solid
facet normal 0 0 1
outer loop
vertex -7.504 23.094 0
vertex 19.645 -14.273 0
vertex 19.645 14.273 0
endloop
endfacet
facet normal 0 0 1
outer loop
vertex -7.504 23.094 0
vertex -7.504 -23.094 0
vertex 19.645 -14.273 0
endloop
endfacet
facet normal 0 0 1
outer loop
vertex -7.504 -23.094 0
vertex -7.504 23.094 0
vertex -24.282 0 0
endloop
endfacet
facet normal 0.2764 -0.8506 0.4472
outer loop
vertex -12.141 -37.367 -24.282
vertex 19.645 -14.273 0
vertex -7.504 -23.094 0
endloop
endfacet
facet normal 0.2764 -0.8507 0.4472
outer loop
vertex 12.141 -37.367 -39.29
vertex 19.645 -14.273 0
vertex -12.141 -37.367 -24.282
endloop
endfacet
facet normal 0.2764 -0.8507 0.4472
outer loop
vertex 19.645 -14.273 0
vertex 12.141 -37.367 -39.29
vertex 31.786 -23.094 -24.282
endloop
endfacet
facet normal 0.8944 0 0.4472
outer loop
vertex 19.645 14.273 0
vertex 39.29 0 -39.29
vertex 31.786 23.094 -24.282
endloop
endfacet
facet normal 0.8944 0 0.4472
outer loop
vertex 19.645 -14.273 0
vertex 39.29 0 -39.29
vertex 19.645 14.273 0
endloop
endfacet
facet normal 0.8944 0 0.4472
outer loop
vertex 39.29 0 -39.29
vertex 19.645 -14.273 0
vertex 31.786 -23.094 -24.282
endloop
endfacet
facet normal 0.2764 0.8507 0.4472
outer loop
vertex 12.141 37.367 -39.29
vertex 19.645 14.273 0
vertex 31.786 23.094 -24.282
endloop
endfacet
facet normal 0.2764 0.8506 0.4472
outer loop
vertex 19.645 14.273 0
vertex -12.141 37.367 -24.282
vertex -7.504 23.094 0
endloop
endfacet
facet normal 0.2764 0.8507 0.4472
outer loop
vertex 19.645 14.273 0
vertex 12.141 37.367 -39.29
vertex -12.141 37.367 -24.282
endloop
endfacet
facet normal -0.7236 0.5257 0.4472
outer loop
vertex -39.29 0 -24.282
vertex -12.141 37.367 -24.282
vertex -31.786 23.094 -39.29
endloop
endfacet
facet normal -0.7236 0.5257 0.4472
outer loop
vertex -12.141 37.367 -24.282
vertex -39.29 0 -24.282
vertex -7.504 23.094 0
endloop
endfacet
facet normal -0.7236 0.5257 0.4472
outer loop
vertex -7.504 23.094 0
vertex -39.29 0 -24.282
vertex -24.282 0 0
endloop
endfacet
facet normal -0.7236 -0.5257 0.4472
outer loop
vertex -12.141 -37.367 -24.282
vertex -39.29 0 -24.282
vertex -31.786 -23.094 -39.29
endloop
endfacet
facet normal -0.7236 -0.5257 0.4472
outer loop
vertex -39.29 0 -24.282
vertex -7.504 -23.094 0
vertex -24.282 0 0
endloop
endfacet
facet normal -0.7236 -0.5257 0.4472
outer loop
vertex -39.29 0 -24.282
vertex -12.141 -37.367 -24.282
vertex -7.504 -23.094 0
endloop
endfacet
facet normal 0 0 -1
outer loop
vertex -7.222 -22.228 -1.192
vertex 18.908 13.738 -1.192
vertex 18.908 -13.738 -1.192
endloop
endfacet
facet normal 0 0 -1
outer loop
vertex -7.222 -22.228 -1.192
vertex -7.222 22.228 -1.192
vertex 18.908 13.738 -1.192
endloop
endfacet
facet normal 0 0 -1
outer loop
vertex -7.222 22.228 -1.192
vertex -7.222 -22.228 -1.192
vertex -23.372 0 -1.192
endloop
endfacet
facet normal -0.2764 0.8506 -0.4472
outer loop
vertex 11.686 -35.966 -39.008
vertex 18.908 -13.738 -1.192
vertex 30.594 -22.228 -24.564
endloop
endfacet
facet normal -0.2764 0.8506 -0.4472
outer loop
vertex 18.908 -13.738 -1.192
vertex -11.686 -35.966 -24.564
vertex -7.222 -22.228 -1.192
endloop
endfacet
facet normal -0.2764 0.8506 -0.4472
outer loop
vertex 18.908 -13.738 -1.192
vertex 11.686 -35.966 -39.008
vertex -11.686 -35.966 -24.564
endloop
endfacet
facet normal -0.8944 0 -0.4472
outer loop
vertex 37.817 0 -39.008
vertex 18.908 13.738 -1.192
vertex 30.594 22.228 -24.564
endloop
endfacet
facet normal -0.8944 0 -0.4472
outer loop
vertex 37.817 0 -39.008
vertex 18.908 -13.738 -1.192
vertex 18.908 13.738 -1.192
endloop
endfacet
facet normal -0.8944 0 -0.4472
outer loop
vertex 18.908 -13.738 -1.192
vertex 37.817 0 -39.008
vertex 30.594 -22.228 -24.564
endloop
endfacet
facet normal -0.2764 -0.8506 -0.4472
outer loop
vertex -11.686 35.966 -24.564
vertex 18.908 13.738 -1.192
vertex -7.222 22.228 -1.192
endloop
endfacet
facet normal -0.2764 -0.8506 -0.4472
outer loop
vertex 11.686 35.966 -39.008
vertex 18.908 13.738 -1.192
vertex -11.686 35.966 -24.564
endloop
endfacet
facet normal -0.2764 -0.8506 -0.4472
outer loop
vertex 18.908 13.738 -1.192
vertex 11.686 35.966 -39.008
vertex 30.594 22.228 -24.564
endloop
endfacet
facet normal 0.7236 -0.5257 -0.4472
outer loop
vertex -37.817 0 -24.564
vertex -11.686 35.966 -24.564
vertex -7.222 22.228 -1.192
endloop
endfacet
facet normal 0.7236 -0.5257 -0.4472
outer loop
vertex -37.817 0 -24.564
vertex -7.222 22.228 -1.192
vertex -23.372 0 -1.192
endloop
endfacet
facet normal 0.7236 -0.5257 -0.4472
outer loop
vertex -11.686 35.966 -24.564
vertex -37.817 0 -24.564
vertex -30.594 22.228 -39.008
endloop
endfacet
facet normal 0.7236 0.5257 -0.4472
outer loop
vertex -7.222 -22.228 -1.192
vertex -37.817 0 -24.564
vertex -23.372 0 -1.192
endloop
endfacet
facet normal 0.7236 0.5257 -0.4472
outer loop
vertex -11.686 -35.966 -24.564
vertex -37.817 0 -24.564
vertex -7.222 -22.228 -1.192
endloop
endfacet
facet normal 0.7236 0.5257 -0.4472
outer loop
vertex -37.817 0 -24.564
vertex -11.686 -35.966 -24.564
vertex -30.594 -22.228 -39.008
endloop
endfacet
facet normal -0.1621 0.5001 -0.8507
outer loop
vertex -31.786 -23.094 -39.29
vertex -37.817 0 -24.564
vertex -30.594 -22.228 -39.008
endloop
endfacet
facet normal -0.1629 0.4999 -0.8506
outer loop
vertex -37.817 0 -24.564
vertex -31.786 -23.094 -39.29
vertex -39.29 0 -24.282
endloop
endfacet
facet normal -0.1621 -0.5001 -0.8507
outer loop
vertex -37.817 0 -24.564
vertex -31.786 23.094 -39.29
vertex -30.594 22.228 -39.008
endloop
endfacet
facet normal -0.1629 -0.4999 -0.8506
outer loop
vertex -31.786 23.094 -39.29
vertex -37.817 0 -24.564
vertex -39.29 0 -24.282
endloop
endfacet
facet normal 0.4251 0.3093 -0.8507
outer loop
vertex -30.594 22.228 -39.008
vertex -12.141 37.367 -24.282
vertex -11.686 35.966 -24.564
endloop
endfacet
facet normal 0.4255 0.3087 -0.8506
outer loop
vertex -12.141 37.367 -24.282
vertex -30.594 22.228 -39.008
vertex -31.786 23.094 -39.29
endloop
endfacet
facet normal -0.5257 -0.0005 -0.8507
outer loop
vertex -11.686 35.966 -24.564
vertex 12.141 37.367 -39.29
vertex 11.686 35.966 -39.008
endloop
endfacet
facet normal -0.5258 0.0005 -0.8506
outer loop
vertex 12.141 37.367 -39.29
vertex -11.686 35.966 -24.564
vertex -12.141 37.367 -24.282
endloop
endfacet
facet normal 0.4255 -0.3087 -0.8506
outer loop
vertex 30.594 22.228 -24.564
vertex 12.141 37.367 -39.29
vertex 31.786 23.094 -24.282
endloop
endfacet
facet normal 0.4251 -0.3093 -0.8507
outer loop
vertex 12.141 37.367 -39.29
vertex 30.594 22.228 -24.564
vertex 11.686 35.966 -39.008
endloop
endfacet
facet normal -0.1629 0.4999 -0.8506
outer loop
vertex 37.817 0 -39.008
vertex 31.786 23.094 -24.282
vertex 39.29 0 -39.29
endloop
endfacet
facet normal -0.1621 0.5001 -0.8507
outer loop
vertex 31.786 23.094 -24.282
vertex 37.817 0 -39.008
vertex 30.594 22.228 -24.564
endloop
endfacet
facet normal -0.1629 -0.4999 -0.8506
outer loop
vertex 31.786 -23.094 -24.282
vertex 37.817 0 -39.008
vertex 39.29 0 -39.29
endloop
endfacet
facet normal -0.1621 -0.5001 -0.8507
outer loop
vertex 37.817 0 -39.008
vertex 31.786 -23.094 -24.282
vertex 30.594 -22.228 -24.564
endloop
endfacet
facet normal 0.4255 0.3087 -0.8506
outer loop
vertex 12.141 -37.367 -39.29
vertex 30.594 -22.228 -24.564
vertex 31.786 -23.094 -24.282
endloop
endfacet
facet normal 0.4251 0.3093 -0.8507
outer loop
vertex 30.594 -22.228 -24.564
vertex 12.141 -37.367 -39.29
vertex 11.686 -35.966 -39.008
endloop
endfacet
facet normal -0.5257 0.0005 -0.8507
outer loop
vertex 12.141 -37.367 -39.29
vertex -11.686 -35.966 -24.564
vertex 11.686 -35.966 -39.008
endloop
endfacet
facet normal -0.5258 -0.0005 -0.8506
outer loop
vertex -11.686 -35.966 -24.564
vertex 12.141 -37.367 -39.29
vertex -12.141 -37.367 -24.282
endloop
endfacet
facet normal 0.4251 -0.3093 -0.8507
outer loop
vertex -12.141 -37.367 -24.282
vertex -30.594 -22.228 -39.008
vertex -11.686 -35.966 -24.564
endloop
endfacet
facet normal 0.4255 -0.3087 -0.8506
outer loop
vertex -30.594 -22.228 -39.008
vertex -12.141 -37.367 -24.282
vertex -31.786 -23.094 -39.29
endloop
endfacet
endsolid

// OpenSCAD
rad = 40;
r = rad / sqrt(3);
r2 = (rad - 1.5) / sqrt(3);

phi = 1 / 2 + sqrt(5 / 4);

p = [[-1,-1,-1] * r,  
[-1,-1,1] * r, 
[-1,1,-1] * r, 
[-1,1,1] * r, 
[1,-1,-1] * r, 
[1,-1,1] * r, 
[1,1,-1] * r, 
[1,1,1] * r,
[0,           1/phi,   phi] * r, 
[0,          -1/phi,   phi] * r,
[0,          1/phi,   -phi] * r, 
[0,          -1/phi, -phi] * r,
[1/phi,   phi,     0] * r,
[-1/phi, phi,    0] * r,
[1/phi,   -phi,  0] * r,
[-1/phi, -phi,  0] * r,
[phi,       0,      1/phi] * r,
[-phi,     0,      1/phi] * r,
[phi,       0,      -1/phi] * r,
[-phi,     0,      -1/phi] * r];

p2 = [[-1,-1,-1] * r2,  
[-1,-1,1] * r2, 
[-1,1,-1] * r2, 
[-1,1,1] * r2, 
[1,-1,-1] * r2, 
[1,-1,1] * r2, 
[1,1,-1] * r2, 
[1,1,1] * r2,
[0,           1/phi,   phi] * r2, 
[0,          -1/phi,   phi] * r2,
[0,          1/phi,   -phi] * r2, 
[0,          -1/phi, -phi] * r2,
[1/phi,   phi,     0] * r2,
[-1/phi, phi,    0] * r2,
[1/phi,   -phi,  0] * r2,
[-1/phi, -phi,  0] * r2,
[phi,       0,      1/phi] * r2,
[-phi,     0,      1/phi] * r2,
[phi,       0,      -1/phi] * r2,
[-phi,     0,      -1/phi] * r2];

f = [[8,9,1,17,3],[9,5,14,15,1],[9,8,7,16,5],[8,3,13,12,7],[3,17,19,2,13],[17,1,15,0,19]];
f2 = [[3+20,17+20,1+20,9+20,8 + 20],
[1 + 20,15 + 20,14 + 20,5 + 20,9 + 20],
[5 + 20,16 + 20,7 + 20,8 + 20,9 + 20],
[7 + 20,12 + 20,13 + 20,3 + 20,8 + 20],
[13 + 20,2 + 20,19 + 20,17 + 20,3 + 20],
[19 + 20,0 + 20,15 + 20,1 + 20,17 + 20]];

f3 = [[19,0,0+20,19+20],[2,19   ,19+20,2+20], [13,2,2+20,13+20],[12,13,13+20,12+20],[7,12,12+20,7+20],[16,7,7+20,16+20],[5,16,16+20,5+20],[14,5,5+20,14+20],[15,14,14+20,15+20],[0,15,15+20,0+20]];

translate([0,0,-2.7527638409422998/2] * r) {
    rotate([0,31.717474411,0]) {
    polyhedron(points = concat(p, p2), faces = concat(f, f2, f3), convexivity = 4);
    }
}
